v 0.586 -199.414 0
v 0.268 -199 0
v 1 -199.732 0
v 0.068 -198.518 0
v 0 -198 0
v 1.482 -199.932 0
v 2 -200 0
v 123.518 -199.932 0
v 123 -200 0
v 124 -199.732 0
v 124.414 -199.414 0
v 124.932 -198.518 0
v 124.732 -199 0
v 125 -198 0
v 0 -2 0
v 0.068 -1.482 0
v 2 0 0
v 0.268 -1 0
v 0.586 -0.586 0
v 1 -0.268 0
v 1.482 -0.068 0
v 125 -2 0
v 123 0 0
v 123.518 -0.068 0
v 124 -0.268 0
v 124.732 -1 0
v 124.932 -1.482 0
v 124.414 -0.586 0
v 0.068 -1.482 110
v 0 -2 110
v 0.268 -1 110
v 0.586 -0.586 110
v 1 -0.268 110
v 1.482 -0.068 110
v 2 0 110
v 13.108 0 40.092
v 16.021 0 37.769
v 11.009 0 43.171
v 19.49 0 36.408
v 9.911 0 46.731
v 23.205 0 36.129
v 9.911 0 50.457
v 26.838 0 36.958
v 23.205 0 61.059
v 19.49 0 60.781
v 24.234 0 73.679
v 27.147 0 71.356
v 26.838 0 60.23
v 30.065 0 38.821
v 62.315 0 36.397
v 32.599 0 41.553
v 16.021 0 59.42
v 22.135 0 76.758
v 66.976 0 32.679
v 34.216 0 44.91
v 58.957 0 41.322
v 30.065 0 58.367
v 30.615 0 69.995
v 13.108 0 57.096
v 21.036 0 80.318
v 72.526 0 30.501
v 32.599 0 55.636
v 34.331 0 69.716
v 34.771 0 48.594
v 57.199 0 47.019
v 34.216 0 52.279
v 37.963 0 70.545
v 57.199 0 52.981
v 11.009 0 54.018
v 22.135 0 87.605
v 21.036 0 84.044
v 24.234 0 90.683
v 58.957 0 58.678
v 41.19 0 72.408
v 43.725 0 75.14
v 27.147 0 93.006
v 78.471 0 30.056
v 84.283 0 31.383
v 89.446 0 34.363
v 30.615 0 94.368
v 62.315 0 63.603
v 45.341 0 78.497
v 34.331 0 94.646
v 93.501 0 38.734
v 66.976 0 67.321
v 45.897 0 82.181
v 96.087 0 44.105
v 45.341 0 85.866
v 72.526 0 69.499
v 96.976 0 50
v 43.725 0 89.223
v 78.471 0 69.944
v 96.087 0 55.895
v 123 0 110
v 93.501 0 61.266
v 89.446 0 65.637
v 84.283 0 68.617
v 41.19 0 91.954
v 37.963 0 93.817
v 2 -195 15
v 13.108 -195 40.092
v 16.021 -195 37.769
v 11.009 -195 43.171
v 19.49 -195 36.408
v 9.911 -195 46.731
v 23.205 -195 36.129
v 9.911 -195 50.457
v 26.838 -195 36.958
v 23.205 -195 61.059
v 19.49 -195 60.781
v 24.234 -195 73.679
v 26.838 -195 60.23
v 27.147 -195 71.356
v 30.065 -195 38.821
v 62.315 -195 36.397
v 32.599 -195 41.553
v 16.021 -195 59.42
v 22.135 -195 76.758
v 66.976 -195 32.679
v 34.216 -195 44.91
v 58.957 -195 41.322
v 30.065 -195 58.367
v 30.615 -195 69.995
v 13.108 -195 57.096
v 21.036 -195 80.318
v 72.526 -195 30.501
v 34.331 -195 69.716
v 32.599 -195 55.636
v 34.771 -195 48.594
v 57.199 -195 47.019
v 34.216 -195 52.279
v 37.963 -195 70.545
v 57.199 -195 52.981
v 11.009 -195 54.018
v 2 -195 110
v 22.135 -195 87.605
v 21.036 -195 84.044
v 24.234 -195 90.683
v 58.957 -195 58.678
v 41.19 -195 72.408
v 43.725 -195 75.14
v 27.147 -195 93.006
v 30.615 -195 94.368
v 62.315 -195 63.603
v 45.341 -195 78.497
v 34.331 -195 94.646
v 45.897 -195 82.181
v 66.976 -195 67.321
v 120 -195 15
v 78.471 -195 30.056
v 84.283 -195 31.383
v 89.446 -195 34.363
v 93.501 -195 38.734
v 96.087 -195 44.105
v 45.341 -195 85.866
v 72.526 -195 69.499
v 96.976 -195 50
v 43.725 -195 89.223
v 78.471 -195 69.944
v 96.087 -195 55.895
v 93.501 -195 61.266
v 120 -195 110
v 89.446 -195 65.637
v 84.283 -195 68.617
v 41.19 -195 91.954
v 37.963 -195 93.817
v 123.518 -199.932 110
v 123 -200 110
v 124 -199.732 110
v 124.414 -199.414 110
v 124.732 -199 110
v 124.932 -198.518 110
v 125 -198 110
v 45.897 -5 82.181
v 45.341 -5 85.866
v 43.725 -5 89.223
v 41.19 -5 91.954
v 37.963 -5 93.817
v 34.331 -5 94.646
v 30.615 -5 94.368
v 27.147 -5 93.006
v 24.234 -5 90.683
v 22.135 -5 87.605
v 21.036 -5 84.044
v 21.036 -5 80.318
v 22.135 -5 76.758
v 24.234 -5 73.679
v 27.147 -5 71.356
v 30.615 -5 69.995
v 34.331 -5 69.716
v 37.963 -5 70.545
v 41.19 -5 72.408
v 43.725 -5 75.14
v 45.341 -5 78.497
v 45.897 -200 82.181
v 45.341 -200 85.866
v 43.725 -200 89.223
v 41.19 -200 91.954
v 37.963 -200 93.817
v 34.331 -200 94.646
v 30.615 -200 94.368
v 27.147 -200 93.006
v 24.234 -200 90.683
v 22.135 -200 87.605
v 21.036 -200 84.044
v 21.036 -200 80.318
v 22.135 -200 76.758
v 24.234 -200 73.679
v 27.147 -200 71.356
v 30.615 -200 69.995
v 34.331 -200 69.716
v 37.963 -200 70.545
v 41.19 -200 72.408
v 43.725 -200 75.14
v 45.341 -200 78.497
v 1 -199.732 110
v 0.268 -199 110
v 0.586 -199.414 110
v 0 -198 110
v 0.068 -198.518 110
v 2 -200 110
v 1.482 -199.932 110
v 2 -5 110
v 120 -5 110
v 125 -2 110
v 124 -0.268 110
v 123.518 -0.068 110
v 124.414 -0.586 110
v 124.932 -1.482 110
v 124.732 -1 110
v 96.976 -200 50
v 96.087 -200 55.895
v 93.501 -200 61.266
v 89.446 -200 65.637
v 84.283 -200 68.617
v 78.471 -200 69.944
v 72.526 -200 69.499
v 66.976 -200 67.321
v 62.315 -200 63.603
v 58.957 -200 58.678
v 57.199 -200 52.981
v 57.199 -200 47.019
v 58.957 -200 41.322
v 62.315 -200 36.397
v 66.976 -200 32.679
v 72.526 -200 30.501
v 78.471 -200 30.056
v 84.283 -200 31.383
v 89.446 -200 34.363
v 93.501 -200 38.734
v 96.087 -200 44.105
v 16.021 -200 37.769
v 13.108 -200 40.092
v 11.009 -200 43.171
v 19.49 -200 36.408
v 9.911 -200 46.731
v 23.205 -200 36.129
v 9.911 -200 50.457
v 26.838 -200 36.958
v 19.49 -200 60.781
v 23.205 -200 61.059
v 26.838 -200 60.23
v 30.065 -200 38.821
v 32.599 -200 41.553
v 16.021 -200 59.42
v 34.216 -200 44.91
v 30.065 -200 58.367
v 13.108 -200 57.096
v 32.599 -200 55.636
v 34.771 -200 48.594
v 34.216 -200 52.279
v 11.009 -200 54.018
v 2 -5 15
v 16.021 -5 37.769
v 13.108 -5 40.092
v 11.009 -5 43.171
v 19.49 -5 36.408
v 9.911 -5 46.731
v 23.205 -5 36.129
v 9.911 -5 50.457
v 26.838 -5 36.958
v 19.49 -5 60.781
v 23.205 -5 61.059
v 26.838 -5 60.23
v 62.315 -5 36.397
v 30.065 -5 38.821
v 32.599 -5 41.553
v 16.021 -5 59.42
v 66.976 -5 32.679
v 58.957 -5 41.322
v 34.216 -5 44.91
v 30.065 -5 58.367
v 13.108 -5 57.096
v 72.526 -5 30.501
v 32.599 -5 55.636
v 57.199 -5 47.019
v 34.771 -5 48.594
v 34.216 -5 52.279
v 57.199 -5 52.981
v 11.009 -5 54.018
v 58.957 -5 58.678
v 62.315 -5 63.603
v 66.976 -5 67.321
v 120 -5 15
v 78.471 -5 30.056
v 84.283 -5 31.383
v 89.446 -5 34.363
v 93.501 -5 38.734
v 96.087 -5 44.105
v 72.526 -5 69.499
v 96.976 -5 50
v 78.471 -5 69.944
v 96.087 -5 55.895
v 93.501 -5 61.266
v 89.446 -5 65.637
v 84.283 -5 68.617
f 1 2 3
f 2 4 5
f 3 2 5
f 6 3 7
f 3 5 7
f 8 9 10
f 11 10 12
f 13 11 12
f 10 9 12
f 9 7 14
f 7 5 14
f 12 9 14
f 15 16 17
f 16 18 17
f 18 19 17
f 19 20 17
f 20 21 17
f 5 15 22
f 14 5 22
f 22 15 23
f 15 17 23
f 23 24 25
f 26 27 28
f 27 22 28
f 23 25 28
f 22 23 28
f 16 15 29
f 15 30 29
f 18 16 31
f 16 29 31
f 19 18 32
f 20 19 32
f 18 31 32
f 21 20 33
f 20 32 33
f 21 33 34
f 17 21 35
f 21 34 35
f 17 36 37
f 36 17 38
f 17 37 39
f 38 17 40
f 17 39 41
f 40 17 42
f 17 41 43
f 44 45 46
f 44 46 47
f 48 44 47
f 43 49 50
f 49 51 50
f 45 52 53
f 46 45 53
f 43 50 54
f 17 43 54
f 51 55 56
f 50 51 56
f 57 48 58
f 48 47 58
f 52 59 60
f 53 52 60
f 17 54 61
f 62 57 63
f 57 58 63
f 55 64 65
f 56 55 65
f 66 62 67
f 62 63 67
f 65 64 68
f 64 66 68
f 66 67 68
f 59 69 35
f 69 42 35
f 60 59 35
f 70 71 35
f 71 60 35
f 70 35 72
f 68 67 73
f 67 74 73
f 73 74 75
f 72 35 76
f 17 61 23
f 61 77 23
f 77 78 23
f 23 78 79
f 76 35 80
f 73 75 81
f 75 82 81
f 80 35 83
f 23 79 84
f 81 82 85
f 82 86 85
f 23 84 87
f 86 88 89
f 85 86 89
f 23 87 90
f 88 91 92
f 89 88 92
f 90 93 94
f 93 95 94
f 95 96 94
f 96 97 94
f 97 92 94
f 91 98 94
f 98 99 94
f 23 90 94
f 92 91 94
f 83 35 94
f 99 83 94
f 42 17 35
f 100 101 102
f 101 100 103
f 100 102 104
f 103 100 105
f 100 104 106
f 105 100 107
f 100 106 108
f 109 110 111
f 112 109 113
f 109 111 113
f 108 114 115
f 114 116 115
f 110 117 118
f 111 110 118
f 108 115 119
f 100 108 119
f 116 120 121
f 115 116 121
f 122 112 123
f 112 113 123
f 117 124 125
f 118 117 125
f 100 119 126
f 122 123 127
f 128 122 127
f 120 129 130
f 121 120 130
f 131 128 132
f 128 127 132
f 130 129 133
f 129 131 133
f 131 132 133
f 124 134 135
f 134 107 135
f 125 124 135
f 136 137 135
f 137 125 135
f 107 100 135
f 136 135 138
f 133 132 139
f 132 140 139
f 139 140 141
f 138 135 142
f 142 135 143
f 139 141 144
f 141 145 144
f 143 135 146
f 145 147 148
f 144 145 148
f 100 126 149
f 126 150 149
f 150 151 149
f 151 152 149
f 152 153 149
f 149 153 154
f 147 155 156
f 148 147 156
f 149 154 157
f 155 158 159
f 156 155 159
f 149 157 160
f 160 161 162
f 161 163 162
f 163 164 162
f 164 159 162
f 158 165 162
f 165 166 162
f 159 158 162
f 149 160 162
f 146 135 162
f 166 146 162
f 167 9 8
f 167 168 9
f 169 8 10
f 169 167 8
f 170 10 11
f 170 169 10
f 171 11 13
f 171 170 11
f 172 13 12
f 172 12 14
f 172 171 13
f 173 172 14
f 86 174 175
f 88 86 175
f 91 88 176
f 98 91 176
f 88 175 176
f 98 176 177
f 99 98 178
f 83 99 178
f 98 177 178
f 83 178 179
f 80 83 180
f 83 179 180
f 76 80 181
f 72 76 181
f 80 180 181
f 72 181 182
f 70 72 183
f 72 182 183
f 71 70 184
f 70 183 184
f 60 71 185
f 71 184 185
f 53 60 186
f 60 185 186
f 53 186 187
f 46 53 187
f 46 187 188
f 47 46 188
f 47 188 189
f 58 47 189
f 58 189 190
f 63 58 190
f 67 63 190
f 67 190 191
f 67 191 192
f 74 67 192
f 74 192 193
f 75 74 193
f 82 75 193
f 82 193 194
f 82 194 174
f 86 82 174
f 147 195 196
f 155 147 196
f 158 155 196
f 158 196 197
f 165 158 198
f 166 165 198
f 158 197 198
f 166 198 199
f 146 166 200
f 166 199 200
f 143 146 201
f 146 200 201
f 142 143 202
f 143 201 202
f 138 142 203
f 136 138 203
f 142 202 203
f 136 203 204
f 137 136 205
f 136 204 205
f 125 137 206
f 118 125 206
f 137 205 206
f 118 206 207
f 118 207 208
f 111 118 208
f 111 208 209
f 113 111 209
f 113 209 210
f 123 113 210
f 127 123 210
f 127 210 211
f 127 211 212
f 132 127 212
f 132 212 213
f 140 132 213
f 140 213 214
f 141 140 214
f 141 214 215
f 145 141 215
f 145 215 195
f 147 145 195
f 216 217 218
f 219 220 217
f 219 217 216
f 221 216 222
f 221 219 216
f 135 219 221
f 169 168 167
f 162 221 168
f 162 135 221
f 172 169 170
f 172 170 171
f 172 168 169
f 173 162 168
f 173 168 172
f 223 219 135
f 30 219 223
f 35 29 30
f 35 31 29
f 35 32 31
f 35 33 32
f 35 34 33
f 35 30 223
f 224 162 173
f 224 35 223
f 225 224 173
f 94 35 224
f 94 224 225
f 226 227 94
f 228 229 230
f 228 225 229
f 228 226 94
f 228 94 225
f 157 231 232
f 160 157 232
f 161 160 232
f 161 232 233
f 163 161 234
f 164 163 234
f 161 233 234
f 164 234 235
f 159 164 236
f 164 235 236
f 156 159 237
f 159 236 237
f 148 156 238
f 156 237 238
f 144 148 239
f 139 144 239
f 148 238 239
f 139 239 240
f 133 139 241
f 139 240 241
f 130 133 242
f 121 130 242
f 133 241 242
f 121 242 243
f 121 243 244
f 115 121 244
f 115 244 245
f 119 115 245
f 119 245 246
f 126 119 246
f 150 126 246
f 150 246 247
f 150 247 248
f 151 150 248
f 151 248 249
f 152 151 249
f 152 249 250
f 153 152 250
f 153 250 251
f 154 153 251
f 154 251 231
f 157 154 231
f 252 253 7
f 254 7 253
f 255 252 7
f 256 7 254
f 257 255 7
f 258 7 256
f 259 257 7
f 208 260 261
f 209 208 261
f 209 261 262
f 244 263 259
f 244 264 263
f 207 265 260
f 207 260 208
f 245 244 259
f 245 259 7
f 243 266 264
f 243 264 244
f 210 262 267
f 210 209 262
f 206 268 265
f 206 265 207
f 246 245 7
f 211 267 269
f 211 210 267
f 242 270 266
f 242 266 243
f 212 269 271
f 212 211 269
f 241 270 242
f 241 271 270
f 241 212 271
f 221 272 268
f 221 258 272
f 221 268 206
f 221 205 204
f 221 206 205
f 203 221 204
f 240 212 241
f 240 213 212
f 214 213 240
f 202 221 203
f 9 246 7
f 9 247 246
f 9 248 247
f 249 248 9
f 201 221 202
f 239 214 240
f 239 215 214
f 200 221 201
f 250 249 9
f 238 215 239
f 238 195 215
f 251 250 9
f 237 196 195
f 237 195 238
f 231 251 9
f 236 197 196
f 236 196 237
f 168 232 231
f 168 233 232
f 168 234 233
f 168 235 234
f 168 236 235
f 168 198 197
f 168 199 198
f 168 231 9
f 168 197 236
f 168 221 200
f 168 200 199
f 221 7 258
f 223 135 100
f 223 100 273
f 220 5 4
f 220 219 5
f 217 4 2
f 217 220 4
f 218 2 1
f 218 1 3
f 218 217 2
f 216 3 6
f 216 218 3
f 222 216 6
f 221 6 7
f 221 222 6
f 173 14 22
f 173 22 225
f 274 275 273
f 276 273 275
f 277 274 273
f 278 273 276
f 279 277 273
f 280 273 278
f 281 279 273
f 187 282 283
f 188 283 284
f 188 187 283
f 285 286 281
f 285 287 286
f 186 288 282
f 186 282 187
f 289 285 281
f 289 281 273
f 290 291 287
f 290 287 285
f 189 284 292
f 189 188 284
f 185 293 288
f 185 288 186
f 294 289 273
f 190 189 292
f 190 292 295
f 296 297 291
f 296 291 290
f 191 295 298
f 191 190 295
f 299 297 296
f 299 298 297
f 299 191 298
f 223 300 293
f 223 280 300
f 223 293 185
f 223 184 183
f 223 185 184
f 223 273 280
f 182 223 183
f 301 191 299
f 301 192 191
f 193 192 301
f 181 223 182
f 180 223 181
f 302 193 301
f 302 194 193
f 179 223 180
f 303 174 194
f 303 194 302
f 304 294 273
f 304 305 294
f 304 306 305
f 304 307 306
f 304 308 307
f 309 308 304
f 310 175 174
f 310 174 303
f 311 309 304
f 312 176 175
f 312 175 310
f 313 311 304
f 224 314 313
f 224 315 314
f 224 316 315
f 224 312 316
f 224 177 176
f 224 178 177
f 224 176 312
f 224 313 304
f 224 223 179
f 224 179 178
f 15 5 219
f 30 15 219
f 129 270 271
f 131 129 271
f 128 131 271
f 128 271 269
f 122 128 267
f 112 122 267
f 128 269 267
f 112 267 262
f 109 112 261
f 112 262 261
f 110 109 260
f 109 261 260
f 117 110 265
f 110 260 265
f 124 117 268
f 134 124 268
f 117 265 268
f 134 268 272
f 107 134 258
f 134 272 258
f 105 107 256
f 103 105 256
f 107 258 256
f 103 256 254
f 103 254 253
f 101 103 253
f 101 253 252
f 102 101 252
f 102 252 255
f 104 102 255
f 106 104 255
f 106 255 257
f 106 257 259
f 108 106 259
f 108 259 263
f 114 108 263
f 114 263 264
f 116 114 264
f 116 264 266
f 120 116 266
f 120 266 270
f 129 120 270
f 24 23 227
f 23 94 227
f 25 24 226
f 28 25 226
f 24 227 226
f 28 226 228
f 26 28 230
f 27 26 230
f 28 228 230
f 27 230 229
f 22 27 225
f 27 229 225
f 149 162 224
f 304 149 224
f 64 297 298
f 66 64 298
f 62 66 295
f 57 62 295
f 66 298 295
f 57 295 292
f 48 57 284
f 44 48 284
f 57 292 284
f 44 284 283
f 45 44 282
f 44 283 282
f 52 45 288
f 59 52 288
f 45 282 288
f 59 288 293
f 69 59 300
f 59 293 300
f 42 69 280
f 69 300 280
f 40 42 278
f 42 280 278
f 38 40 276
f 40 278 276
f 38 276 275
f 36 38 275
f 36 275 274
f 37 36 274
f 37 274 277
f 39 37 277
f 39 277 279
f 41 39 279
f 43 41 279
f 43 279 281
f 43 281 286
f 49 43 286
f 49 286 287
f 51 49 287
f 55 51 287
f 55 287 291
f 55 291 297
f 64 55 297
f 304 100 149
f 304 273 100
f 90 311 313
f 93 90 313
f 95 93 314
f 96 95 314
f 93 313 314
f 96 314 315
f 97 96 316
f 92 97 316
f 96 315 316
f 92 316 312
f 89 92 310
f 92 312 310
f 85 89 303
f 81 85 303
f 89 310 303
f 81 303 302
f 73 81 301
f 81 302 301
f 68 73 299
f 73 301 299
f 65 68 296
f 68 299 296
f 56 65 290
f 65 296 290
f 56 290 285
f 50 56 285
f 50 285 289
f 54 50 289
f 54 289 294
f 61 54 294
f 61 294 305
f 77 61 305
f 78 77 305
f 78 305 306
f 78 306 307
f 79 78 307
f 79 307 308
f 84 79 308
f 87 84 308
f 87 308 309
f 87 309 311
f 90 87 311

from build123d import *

# Parameters (mm, degrees)
F0_W      = 125
F0_H      = 110
F1_DEPTH  = 200
F2_W      = 115.000002
F2_H      = 190.000002
F3_DEPTH  = 95
F4_R      = 2
F5_R      = 20
F7_DEPTH  = 200.001
F6_R      = 12.5
F8_DEPTH  = 200.001
F9_W      = 3
F9_H      = 190.000002
F10_DEPTH = 95


with BuildPart() as f1:
    # F0 (on Front) → F1 (new body)
    with BuildSketch(Plane.XZ):
        with Locations((62.5, 55)):
            Rectangle(F0_W, F0_H)
    extrude(amount=F1_DEPTH)

    # F2 (on face) → F3 (cut)
    with BuildSketch(Plane.XY.offset(110)):
        with Locations((62.500001, -100.000001)):
            Rectangle(F2_W, F2_H)
    extrude(amount=-F3_DEPTH, mode=Mode.SUBTRACT)

    # F4
    f4_edges = [f1.edges().sort_by_distance(p)[0] for p in [
        (125, 0, 55),
        (0, 0, 55),
        (125, -200, 55),
        (0, -200, 55),
    ]]
    fillet(f4_edges, radius=F4_R)

    # F5 (on face) → F7 (cut, through all)
    with BuildSketch(Plane.XZ.offset(200)):
        with Locations((76.975974, 50)):
            Circle(F5_R)
    extrude(amount=-F7_DEPTH, mode=Mode.SUBTRACT)

    # F6 (on face) → F8 (cut, through all)
    with BuildSketch(Plane.XZ.offset(200)):
        with Locations((22.27135, 48.594251)):
            Circle(F6_R)
        with Locations((33.396717, 82.181148)):
            Circle(F6_R)
    extrude(amount=-F8_DEPTH, mode=Mode.SUBTRACT)

    # F9 (on face) → F10 (cut, through all)
    with BuildSketch(Plane.XY.offset(110)):
        with Locations((3.5, -100.000001)):
            Rectangle(F9_W, F9_H)
    extrude(amount=-F10_DEPTH, mode=Mode.SUBTRACT)


solid = f1.part
